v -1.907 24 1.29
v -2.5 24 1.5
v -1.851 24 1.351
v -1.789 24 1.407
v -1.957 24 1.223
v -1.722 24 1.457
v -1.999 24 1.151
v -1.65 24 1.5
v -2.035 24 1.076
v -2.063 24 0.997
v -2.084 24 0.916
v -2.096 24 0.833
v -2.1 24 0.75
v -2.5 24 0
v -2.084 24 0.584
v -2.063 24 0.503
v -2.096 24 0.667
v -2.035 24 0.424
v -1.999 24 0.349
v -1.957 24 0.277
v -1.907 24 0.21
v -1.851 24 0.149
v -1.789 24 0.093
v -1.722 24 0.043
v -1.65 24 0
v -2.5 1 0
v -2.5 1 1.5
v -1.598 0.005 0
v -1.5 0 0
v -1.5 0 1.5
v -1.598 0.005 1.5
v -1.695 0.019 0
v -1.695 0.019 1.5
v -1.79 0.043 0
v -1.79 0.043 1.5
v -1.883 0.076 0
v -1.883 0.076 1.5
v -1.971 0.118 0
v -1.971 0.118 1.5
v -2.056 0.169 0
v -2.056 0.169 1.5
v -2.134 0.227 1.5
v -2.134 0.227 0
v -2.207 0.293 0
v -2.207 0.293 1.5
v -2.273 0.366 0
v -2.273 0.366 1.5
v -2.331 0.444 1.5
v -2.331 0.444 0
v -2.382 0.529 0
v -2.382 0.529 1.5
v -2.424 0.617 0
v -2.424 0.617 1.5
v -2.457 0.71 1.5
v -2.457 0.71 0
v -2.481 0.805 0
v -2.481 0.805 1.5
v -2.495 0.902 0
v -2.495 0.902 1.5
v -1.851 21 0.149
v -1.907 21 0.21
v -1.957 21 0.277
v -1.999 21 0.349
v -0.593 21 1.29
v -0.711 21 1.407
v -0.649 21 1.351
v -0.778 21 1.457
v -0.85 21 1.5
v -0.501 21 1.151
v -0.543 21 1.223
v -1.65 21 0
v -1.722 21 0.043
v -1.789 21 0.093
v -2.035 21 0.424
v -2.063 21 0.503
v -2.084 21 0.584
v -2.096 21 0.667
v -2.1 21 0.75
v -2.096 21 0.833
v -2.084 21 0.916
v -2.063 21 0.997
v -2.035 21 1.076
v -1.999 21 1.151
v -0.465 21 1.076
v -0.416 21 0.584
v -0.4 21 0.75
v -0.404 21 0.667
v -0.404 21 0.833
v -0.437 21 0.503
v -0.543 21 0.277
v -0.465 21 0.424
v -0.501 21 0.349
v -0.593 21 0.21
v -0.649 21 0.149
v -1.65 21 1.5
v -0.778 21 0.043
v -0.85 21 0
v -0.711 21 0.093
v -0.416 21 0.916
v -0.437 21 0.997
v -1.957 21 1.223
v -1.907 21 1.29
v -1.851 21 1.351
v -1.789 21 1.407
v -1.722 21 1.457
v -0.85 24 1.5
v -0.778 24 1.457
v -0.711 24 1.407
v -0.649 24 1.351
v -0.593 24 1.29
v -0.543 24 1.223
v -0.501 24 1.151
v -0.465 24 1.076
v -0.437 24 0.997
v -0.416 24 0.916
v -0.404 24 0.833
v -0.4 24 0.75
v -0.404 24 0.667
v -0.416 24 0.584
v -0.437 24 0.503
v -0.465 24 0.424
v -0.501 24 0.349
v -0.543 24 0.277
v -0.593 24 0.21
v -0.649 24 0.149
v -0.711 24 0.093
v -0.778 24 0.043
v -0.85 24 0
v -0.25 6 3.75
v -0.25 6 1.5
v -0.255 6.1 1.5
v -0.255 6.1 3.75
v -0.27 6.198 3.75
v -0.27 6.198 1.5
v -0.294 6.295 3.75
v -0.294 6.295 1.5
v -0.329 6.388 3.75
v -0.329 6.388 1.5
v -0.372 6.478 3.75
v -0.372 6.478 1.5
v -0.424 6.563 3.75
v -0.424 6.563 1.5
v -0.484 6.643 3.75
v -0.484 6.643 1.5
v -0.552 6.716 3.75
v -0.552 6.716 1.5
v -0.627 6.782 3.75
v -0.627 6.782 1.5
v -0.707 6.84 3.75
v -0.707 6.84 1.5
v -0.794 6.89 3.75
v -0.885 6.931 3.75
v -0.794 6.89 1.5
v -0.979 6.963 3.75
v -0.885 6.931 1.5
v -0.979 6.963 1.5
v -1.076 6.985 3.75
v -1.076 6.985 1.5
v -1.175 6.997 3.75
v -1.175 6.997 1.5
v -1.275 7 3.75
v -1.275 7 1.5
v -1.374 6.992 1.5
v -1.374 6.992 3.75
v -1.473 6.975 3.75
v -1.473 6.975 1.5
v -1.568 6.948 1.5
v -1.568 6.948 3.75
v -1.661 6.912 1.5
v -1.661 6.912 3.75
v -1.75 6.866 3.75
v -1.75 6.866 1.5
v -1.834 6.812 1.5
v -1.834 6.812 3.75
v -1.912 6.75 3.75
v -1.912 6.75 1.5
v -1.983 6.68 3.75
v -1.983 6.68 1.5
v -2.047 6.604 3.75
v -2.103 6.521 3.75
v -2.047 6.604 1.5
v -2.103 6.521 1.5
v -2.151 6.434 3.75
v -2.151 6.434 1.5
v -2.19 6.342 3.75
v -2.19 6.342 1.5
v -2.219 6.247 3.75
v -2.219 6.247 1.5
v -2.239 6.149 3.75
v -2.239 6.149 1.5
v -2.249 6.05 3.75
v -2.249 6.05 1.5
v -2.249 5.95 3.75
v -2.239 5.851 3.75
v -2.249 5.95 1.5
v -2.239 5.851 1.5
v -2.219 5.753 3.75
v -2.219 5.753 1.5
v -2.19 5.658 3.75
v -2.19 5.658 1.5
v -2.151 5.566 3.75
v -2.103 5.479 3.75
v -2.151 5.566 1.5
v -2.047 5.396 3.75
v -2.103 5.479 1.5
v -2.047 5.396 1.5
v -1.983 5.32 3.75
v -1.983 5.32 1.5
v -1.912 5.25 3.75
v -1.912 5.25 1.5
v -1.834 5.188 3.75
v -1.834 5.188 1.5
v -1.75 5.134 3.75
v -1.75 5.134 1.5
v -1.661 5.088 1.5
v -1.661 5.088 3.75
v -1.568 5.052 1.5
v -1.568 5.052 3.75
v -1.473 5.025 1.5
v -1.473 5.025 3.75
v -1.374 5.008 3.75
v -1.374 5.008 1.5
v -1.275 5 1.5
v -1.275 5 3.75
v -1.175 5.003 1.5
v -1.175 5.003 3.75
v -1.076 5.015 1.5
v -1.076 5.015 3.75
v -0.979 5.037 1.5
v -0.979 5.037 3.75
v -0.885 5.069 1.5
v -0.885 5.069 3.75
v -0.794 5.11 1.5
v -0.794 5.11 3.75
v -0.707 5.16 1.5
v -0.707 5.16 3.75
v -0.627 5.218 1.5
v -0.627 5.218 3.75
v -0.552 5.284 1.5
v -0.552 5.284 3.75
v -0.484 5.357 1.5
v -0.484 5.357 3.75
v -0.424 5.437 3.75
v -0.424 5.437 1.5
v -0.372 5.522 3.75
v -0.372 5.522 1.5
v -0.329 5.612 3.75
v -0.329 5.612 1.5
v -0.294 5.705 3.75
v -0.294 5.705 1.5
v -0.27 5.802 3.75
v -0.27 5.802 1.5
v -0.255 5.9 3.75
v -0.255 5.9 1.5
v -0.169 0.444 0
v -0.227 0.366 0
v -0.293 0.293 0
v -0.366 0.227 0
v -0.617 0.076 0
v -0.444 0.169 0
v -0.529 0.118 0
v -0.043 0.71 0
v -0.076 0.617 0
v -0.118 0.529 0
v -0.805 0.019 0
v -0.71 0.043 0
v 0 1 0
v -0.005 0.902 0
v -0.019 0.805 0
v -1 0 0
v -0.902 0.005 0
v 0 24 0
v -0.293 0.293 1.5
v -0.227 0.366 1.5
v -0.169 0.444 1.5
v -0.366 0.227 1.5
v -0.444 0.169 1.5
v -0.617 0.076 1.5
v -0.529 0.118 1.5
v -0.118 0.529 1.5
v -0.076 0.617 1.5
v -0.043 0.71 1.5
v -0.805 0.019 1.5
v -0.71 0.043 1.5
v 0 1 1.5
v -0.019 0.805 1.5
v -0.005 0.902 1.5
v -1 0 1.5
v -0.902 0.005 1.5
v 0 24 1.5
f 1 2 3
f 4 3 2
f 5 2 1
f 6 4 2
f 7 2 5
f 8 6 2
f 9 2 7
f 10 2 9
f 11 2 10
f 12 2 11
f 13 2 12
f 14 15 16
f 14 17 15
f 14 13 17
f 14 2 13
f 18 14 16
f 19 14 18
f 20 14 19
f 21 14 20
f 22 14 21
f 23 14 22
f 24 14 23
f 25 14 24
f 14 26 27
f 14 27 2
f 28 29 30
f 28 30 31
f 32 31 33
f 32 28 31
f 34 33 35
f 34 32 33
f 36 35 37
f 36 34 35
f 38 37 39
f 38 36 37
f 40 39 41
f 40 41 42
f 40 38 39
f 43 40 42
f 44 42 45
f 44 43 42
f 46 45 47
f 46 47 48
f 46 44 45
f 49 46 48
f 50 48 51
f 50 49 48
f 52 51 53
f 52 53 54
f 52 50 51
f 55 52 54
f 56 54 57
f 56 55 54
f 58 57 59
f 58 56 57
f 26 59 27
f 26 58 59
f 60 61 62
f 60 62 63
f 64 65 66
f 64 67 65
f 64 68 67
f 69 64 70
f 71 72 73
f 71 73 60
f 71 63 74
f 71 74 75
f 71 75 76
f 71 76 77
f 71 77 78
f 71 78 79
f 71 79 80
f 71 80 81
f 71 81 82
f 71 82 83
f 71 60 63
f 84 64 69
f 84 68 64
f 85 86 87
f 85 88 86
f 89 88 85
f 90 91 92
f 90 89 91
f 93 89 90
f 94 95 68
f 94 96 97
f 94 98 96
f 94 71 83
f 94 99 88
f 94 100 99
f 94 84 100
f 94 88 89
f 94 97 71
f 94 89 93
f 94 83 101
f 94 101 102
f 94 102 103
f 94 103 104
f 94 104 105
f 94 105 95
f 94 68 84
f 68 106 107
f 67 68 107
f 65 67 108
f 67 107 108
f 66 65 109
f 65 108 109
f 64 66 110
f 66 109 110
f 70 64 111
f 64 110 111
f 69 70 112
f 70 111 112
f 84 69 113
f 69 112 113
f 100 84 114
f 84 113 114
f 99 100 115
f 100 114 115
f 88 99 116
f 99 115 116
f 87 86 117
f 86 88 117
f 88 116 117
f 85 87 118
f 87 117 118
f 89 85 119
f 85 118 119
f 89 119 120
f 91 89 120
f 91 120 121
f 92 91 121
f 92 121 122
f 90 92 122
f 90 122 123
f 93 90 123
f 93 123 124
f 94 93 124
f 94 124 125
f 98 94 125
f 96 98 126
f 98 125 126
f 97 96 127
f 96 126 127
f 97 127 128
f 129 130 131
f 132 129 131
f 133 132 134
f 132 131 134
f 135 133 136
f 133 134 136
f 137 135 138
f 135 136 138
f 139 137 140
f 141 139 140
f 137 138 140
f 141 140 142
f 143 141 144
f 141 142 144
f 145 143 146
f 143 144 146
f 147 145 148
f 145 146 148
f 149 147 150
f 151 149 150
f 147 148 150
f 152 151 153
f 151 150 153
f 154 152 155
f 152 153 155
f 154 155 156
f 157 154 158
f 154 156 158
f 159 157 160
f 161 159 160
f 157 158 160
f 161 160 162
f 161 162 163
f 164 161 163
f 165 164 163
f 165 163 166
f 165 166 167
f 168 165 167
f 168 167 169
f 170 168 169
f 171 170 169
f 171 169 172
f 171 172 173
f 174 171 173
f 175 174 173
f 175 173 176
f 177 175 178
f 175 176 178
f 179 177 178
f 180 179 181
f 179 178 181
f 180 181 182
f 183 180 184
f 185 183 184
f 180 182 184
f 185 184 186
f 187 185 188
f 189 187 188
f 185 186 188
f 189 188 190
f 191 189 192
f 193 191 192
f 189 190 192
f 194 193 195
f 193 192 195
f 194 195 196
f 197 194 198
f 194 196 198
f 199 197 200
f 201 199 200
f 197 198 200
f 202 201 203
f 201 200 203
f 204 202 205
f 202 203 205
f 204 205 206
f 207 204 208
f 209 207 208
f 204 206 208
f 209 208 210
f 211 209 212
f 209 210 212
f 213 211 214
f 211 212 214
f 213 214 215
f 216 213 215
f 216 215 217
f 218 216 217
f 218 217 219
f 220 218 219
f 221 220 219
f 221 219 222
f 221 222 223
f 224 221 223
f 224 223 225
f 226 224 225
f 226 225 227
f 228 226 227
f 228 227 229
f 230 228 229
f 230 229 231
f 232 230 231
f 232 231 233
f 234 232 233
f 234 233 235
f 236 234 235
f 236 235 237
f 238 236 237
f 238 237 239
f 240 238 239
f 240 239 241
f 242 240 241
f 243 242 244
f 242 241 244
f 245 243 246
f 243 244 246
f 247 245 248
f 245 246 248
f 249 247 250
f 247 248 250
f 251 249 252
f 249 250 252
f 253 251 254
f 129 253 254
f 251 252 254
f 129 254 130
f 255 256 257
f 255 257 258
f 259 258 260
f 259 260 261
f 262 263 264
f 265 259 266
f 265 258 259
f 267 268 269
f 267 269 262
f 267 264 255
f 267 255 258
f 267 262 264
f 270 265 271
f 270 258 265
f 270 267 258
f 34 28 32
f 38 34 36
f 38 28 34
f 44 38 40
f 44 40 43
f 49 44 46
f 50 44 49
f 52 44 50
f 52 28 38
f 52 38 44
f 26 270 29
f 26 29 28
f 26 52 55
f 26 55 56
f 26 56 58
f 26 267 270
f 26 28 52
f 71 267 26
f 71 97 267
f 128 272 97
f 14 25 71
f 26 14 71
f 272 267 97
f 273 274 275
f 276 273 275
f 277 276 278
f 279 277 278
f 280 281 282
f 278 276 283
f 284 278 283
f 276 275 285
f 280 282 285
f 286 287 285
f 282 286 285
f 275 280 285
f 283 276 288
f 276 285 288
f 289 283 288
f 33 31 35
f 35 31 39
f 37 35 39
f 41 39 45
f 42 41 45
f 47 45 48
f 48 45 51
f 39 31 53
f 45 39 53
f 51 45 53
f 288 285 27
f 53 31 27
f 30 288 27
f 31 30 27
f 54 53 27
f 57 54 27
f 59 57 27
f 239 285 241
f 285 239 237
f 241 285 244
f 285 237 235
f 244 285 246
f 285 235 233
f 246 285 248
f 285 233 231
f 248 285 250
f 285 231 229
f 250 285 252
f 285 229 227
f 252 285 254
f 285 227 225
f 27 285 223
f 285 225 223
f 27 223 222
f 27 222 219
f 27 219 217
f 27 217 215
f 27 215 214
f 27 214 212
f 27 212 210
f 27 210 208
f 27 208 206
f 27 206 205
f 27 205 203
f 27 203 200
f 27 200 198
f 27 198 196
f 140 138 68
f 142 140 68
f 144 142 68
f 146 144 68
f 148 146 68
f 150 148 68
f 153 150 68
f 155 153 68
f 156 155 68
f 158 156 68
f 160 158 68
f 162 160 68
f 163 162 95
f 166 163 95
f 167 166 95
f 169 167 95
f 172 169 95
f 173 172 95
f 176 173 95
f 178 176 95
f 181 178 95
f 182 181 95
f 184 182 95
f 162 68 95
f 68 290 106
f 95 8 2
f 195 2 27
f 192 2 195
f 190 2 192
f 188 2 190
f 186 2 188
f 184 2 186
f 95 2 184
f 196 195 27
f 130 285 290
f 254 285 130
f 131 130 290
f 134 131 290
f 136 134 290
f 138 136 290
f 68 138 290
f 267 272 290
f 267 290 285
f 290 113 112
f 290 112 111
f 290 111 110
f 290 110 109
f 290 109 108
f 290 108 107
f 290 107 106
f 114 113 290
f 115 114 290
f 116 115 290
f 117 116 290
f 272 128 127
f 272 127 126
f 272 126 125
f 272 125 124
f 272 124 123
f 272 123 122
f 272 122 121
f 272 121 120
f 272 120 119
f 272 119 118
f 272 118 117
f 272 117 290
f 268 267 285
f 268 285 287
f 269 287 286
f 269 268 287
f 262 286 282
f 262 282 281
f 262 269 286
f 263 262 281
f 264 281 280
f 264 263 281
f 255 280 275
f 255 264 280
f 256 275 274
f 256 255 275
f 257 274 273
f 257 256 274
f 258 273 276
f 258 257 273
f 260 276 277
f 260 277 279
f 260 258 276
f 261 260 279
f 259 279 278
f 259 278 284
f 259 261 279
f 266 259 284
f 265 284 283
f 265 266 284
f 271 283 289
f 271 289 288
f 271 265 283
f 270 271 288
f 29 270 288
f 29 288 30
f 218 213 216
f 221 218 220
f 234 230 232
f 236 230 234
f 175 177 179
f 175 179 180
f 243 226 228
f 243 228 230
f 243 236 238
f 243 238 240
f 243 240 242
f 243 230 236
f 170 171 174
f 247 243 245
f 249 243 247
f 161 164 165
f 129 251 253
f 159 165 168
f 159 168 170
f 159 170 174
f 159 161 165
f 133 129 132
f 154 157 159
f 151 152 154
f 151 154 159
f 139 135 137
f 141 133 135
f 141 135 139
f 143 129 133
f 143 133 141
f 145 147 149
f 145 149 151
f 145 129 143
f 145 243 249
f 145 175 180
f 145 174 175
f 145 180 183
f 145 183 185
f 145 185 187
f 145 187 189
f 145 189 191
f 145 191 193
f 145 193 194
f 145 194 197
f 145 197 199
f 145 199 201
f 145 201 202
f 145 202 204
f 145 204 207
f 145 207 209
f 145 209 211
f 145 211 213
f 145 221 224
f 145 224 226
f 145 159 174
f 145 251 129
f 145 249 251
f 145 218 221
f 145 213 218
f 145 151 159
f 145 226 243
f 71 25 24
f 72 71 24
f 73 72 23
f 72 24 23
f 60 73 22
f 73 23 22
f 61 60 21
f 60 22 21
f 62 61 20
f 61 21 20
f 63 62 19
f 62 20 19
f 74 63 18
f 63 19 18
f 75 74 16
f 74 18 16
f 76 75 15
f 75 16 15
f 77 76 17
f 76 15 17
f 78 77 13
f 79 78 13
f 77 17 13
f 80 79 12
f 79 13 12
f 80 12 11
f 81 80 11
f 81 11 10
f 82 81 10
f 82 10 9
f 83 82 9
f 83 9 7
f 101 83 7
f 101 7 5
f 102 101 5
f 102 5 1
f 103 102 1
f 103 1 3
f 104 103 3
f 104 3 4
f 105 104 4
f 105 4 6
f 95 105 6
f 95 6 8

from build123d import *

# Parameters (mm, degrees)
EXTRUDE_1_DEPTH     = 1.5
SKETCH_2_R          = 1
EXTRUDE_2_DEPTH     = 2.25
SKETCH_3_R          = 0.85
CUT_EXTRUDE_1_DEPTH = 3


with BuildPart() as part:
    # Эскиз1 → Бобышка-Вытянуть1 (new body)
    with BuildSketch(Plane.XY):
        with BuildLine():
            Line((-1, 0), (-1.5, 0))
            ThreePointArc((-1.5, 0), (-2.207106781, 0.292893219), (-2.5, 1))
            Line((-2.5, 1), (-2.5, 24))
            Line((-2.5, 24), (0, 24))
            Line((0, 24), (0, 1))
            ThreePointArc((0, 1), (-0.292893219, 0.292893219), (-1, 0))
        make_face()
    extrude(amount=EXTRUDE_1_DEPTH)

    # Эскиз2 → Бобышка-Вытянуть2 (add)
    with BuildSketch(Plane.XY.offset(1.5)):
        with Locations((-1.25, 6)):
            Circle(SKETCH_2_R)
    extrude(amount=EXTRUDE_2_DEPTH)

    # Эскиз3 → Вырез-Вытянуть1 (cut)
    with BuildSketch(Plane(origin=(0, 24, 0), x_dir=(1, 0, 0), z_dir=(0, 1, 0))):
        with Locations((-1.25, -0.75)):
            Circle(SKETCH_3_R)
    extrude(amount=-CUT_EXTRUDE_1_DEPTH, mode=Mode.SUBTRACT)


solid = part.part
